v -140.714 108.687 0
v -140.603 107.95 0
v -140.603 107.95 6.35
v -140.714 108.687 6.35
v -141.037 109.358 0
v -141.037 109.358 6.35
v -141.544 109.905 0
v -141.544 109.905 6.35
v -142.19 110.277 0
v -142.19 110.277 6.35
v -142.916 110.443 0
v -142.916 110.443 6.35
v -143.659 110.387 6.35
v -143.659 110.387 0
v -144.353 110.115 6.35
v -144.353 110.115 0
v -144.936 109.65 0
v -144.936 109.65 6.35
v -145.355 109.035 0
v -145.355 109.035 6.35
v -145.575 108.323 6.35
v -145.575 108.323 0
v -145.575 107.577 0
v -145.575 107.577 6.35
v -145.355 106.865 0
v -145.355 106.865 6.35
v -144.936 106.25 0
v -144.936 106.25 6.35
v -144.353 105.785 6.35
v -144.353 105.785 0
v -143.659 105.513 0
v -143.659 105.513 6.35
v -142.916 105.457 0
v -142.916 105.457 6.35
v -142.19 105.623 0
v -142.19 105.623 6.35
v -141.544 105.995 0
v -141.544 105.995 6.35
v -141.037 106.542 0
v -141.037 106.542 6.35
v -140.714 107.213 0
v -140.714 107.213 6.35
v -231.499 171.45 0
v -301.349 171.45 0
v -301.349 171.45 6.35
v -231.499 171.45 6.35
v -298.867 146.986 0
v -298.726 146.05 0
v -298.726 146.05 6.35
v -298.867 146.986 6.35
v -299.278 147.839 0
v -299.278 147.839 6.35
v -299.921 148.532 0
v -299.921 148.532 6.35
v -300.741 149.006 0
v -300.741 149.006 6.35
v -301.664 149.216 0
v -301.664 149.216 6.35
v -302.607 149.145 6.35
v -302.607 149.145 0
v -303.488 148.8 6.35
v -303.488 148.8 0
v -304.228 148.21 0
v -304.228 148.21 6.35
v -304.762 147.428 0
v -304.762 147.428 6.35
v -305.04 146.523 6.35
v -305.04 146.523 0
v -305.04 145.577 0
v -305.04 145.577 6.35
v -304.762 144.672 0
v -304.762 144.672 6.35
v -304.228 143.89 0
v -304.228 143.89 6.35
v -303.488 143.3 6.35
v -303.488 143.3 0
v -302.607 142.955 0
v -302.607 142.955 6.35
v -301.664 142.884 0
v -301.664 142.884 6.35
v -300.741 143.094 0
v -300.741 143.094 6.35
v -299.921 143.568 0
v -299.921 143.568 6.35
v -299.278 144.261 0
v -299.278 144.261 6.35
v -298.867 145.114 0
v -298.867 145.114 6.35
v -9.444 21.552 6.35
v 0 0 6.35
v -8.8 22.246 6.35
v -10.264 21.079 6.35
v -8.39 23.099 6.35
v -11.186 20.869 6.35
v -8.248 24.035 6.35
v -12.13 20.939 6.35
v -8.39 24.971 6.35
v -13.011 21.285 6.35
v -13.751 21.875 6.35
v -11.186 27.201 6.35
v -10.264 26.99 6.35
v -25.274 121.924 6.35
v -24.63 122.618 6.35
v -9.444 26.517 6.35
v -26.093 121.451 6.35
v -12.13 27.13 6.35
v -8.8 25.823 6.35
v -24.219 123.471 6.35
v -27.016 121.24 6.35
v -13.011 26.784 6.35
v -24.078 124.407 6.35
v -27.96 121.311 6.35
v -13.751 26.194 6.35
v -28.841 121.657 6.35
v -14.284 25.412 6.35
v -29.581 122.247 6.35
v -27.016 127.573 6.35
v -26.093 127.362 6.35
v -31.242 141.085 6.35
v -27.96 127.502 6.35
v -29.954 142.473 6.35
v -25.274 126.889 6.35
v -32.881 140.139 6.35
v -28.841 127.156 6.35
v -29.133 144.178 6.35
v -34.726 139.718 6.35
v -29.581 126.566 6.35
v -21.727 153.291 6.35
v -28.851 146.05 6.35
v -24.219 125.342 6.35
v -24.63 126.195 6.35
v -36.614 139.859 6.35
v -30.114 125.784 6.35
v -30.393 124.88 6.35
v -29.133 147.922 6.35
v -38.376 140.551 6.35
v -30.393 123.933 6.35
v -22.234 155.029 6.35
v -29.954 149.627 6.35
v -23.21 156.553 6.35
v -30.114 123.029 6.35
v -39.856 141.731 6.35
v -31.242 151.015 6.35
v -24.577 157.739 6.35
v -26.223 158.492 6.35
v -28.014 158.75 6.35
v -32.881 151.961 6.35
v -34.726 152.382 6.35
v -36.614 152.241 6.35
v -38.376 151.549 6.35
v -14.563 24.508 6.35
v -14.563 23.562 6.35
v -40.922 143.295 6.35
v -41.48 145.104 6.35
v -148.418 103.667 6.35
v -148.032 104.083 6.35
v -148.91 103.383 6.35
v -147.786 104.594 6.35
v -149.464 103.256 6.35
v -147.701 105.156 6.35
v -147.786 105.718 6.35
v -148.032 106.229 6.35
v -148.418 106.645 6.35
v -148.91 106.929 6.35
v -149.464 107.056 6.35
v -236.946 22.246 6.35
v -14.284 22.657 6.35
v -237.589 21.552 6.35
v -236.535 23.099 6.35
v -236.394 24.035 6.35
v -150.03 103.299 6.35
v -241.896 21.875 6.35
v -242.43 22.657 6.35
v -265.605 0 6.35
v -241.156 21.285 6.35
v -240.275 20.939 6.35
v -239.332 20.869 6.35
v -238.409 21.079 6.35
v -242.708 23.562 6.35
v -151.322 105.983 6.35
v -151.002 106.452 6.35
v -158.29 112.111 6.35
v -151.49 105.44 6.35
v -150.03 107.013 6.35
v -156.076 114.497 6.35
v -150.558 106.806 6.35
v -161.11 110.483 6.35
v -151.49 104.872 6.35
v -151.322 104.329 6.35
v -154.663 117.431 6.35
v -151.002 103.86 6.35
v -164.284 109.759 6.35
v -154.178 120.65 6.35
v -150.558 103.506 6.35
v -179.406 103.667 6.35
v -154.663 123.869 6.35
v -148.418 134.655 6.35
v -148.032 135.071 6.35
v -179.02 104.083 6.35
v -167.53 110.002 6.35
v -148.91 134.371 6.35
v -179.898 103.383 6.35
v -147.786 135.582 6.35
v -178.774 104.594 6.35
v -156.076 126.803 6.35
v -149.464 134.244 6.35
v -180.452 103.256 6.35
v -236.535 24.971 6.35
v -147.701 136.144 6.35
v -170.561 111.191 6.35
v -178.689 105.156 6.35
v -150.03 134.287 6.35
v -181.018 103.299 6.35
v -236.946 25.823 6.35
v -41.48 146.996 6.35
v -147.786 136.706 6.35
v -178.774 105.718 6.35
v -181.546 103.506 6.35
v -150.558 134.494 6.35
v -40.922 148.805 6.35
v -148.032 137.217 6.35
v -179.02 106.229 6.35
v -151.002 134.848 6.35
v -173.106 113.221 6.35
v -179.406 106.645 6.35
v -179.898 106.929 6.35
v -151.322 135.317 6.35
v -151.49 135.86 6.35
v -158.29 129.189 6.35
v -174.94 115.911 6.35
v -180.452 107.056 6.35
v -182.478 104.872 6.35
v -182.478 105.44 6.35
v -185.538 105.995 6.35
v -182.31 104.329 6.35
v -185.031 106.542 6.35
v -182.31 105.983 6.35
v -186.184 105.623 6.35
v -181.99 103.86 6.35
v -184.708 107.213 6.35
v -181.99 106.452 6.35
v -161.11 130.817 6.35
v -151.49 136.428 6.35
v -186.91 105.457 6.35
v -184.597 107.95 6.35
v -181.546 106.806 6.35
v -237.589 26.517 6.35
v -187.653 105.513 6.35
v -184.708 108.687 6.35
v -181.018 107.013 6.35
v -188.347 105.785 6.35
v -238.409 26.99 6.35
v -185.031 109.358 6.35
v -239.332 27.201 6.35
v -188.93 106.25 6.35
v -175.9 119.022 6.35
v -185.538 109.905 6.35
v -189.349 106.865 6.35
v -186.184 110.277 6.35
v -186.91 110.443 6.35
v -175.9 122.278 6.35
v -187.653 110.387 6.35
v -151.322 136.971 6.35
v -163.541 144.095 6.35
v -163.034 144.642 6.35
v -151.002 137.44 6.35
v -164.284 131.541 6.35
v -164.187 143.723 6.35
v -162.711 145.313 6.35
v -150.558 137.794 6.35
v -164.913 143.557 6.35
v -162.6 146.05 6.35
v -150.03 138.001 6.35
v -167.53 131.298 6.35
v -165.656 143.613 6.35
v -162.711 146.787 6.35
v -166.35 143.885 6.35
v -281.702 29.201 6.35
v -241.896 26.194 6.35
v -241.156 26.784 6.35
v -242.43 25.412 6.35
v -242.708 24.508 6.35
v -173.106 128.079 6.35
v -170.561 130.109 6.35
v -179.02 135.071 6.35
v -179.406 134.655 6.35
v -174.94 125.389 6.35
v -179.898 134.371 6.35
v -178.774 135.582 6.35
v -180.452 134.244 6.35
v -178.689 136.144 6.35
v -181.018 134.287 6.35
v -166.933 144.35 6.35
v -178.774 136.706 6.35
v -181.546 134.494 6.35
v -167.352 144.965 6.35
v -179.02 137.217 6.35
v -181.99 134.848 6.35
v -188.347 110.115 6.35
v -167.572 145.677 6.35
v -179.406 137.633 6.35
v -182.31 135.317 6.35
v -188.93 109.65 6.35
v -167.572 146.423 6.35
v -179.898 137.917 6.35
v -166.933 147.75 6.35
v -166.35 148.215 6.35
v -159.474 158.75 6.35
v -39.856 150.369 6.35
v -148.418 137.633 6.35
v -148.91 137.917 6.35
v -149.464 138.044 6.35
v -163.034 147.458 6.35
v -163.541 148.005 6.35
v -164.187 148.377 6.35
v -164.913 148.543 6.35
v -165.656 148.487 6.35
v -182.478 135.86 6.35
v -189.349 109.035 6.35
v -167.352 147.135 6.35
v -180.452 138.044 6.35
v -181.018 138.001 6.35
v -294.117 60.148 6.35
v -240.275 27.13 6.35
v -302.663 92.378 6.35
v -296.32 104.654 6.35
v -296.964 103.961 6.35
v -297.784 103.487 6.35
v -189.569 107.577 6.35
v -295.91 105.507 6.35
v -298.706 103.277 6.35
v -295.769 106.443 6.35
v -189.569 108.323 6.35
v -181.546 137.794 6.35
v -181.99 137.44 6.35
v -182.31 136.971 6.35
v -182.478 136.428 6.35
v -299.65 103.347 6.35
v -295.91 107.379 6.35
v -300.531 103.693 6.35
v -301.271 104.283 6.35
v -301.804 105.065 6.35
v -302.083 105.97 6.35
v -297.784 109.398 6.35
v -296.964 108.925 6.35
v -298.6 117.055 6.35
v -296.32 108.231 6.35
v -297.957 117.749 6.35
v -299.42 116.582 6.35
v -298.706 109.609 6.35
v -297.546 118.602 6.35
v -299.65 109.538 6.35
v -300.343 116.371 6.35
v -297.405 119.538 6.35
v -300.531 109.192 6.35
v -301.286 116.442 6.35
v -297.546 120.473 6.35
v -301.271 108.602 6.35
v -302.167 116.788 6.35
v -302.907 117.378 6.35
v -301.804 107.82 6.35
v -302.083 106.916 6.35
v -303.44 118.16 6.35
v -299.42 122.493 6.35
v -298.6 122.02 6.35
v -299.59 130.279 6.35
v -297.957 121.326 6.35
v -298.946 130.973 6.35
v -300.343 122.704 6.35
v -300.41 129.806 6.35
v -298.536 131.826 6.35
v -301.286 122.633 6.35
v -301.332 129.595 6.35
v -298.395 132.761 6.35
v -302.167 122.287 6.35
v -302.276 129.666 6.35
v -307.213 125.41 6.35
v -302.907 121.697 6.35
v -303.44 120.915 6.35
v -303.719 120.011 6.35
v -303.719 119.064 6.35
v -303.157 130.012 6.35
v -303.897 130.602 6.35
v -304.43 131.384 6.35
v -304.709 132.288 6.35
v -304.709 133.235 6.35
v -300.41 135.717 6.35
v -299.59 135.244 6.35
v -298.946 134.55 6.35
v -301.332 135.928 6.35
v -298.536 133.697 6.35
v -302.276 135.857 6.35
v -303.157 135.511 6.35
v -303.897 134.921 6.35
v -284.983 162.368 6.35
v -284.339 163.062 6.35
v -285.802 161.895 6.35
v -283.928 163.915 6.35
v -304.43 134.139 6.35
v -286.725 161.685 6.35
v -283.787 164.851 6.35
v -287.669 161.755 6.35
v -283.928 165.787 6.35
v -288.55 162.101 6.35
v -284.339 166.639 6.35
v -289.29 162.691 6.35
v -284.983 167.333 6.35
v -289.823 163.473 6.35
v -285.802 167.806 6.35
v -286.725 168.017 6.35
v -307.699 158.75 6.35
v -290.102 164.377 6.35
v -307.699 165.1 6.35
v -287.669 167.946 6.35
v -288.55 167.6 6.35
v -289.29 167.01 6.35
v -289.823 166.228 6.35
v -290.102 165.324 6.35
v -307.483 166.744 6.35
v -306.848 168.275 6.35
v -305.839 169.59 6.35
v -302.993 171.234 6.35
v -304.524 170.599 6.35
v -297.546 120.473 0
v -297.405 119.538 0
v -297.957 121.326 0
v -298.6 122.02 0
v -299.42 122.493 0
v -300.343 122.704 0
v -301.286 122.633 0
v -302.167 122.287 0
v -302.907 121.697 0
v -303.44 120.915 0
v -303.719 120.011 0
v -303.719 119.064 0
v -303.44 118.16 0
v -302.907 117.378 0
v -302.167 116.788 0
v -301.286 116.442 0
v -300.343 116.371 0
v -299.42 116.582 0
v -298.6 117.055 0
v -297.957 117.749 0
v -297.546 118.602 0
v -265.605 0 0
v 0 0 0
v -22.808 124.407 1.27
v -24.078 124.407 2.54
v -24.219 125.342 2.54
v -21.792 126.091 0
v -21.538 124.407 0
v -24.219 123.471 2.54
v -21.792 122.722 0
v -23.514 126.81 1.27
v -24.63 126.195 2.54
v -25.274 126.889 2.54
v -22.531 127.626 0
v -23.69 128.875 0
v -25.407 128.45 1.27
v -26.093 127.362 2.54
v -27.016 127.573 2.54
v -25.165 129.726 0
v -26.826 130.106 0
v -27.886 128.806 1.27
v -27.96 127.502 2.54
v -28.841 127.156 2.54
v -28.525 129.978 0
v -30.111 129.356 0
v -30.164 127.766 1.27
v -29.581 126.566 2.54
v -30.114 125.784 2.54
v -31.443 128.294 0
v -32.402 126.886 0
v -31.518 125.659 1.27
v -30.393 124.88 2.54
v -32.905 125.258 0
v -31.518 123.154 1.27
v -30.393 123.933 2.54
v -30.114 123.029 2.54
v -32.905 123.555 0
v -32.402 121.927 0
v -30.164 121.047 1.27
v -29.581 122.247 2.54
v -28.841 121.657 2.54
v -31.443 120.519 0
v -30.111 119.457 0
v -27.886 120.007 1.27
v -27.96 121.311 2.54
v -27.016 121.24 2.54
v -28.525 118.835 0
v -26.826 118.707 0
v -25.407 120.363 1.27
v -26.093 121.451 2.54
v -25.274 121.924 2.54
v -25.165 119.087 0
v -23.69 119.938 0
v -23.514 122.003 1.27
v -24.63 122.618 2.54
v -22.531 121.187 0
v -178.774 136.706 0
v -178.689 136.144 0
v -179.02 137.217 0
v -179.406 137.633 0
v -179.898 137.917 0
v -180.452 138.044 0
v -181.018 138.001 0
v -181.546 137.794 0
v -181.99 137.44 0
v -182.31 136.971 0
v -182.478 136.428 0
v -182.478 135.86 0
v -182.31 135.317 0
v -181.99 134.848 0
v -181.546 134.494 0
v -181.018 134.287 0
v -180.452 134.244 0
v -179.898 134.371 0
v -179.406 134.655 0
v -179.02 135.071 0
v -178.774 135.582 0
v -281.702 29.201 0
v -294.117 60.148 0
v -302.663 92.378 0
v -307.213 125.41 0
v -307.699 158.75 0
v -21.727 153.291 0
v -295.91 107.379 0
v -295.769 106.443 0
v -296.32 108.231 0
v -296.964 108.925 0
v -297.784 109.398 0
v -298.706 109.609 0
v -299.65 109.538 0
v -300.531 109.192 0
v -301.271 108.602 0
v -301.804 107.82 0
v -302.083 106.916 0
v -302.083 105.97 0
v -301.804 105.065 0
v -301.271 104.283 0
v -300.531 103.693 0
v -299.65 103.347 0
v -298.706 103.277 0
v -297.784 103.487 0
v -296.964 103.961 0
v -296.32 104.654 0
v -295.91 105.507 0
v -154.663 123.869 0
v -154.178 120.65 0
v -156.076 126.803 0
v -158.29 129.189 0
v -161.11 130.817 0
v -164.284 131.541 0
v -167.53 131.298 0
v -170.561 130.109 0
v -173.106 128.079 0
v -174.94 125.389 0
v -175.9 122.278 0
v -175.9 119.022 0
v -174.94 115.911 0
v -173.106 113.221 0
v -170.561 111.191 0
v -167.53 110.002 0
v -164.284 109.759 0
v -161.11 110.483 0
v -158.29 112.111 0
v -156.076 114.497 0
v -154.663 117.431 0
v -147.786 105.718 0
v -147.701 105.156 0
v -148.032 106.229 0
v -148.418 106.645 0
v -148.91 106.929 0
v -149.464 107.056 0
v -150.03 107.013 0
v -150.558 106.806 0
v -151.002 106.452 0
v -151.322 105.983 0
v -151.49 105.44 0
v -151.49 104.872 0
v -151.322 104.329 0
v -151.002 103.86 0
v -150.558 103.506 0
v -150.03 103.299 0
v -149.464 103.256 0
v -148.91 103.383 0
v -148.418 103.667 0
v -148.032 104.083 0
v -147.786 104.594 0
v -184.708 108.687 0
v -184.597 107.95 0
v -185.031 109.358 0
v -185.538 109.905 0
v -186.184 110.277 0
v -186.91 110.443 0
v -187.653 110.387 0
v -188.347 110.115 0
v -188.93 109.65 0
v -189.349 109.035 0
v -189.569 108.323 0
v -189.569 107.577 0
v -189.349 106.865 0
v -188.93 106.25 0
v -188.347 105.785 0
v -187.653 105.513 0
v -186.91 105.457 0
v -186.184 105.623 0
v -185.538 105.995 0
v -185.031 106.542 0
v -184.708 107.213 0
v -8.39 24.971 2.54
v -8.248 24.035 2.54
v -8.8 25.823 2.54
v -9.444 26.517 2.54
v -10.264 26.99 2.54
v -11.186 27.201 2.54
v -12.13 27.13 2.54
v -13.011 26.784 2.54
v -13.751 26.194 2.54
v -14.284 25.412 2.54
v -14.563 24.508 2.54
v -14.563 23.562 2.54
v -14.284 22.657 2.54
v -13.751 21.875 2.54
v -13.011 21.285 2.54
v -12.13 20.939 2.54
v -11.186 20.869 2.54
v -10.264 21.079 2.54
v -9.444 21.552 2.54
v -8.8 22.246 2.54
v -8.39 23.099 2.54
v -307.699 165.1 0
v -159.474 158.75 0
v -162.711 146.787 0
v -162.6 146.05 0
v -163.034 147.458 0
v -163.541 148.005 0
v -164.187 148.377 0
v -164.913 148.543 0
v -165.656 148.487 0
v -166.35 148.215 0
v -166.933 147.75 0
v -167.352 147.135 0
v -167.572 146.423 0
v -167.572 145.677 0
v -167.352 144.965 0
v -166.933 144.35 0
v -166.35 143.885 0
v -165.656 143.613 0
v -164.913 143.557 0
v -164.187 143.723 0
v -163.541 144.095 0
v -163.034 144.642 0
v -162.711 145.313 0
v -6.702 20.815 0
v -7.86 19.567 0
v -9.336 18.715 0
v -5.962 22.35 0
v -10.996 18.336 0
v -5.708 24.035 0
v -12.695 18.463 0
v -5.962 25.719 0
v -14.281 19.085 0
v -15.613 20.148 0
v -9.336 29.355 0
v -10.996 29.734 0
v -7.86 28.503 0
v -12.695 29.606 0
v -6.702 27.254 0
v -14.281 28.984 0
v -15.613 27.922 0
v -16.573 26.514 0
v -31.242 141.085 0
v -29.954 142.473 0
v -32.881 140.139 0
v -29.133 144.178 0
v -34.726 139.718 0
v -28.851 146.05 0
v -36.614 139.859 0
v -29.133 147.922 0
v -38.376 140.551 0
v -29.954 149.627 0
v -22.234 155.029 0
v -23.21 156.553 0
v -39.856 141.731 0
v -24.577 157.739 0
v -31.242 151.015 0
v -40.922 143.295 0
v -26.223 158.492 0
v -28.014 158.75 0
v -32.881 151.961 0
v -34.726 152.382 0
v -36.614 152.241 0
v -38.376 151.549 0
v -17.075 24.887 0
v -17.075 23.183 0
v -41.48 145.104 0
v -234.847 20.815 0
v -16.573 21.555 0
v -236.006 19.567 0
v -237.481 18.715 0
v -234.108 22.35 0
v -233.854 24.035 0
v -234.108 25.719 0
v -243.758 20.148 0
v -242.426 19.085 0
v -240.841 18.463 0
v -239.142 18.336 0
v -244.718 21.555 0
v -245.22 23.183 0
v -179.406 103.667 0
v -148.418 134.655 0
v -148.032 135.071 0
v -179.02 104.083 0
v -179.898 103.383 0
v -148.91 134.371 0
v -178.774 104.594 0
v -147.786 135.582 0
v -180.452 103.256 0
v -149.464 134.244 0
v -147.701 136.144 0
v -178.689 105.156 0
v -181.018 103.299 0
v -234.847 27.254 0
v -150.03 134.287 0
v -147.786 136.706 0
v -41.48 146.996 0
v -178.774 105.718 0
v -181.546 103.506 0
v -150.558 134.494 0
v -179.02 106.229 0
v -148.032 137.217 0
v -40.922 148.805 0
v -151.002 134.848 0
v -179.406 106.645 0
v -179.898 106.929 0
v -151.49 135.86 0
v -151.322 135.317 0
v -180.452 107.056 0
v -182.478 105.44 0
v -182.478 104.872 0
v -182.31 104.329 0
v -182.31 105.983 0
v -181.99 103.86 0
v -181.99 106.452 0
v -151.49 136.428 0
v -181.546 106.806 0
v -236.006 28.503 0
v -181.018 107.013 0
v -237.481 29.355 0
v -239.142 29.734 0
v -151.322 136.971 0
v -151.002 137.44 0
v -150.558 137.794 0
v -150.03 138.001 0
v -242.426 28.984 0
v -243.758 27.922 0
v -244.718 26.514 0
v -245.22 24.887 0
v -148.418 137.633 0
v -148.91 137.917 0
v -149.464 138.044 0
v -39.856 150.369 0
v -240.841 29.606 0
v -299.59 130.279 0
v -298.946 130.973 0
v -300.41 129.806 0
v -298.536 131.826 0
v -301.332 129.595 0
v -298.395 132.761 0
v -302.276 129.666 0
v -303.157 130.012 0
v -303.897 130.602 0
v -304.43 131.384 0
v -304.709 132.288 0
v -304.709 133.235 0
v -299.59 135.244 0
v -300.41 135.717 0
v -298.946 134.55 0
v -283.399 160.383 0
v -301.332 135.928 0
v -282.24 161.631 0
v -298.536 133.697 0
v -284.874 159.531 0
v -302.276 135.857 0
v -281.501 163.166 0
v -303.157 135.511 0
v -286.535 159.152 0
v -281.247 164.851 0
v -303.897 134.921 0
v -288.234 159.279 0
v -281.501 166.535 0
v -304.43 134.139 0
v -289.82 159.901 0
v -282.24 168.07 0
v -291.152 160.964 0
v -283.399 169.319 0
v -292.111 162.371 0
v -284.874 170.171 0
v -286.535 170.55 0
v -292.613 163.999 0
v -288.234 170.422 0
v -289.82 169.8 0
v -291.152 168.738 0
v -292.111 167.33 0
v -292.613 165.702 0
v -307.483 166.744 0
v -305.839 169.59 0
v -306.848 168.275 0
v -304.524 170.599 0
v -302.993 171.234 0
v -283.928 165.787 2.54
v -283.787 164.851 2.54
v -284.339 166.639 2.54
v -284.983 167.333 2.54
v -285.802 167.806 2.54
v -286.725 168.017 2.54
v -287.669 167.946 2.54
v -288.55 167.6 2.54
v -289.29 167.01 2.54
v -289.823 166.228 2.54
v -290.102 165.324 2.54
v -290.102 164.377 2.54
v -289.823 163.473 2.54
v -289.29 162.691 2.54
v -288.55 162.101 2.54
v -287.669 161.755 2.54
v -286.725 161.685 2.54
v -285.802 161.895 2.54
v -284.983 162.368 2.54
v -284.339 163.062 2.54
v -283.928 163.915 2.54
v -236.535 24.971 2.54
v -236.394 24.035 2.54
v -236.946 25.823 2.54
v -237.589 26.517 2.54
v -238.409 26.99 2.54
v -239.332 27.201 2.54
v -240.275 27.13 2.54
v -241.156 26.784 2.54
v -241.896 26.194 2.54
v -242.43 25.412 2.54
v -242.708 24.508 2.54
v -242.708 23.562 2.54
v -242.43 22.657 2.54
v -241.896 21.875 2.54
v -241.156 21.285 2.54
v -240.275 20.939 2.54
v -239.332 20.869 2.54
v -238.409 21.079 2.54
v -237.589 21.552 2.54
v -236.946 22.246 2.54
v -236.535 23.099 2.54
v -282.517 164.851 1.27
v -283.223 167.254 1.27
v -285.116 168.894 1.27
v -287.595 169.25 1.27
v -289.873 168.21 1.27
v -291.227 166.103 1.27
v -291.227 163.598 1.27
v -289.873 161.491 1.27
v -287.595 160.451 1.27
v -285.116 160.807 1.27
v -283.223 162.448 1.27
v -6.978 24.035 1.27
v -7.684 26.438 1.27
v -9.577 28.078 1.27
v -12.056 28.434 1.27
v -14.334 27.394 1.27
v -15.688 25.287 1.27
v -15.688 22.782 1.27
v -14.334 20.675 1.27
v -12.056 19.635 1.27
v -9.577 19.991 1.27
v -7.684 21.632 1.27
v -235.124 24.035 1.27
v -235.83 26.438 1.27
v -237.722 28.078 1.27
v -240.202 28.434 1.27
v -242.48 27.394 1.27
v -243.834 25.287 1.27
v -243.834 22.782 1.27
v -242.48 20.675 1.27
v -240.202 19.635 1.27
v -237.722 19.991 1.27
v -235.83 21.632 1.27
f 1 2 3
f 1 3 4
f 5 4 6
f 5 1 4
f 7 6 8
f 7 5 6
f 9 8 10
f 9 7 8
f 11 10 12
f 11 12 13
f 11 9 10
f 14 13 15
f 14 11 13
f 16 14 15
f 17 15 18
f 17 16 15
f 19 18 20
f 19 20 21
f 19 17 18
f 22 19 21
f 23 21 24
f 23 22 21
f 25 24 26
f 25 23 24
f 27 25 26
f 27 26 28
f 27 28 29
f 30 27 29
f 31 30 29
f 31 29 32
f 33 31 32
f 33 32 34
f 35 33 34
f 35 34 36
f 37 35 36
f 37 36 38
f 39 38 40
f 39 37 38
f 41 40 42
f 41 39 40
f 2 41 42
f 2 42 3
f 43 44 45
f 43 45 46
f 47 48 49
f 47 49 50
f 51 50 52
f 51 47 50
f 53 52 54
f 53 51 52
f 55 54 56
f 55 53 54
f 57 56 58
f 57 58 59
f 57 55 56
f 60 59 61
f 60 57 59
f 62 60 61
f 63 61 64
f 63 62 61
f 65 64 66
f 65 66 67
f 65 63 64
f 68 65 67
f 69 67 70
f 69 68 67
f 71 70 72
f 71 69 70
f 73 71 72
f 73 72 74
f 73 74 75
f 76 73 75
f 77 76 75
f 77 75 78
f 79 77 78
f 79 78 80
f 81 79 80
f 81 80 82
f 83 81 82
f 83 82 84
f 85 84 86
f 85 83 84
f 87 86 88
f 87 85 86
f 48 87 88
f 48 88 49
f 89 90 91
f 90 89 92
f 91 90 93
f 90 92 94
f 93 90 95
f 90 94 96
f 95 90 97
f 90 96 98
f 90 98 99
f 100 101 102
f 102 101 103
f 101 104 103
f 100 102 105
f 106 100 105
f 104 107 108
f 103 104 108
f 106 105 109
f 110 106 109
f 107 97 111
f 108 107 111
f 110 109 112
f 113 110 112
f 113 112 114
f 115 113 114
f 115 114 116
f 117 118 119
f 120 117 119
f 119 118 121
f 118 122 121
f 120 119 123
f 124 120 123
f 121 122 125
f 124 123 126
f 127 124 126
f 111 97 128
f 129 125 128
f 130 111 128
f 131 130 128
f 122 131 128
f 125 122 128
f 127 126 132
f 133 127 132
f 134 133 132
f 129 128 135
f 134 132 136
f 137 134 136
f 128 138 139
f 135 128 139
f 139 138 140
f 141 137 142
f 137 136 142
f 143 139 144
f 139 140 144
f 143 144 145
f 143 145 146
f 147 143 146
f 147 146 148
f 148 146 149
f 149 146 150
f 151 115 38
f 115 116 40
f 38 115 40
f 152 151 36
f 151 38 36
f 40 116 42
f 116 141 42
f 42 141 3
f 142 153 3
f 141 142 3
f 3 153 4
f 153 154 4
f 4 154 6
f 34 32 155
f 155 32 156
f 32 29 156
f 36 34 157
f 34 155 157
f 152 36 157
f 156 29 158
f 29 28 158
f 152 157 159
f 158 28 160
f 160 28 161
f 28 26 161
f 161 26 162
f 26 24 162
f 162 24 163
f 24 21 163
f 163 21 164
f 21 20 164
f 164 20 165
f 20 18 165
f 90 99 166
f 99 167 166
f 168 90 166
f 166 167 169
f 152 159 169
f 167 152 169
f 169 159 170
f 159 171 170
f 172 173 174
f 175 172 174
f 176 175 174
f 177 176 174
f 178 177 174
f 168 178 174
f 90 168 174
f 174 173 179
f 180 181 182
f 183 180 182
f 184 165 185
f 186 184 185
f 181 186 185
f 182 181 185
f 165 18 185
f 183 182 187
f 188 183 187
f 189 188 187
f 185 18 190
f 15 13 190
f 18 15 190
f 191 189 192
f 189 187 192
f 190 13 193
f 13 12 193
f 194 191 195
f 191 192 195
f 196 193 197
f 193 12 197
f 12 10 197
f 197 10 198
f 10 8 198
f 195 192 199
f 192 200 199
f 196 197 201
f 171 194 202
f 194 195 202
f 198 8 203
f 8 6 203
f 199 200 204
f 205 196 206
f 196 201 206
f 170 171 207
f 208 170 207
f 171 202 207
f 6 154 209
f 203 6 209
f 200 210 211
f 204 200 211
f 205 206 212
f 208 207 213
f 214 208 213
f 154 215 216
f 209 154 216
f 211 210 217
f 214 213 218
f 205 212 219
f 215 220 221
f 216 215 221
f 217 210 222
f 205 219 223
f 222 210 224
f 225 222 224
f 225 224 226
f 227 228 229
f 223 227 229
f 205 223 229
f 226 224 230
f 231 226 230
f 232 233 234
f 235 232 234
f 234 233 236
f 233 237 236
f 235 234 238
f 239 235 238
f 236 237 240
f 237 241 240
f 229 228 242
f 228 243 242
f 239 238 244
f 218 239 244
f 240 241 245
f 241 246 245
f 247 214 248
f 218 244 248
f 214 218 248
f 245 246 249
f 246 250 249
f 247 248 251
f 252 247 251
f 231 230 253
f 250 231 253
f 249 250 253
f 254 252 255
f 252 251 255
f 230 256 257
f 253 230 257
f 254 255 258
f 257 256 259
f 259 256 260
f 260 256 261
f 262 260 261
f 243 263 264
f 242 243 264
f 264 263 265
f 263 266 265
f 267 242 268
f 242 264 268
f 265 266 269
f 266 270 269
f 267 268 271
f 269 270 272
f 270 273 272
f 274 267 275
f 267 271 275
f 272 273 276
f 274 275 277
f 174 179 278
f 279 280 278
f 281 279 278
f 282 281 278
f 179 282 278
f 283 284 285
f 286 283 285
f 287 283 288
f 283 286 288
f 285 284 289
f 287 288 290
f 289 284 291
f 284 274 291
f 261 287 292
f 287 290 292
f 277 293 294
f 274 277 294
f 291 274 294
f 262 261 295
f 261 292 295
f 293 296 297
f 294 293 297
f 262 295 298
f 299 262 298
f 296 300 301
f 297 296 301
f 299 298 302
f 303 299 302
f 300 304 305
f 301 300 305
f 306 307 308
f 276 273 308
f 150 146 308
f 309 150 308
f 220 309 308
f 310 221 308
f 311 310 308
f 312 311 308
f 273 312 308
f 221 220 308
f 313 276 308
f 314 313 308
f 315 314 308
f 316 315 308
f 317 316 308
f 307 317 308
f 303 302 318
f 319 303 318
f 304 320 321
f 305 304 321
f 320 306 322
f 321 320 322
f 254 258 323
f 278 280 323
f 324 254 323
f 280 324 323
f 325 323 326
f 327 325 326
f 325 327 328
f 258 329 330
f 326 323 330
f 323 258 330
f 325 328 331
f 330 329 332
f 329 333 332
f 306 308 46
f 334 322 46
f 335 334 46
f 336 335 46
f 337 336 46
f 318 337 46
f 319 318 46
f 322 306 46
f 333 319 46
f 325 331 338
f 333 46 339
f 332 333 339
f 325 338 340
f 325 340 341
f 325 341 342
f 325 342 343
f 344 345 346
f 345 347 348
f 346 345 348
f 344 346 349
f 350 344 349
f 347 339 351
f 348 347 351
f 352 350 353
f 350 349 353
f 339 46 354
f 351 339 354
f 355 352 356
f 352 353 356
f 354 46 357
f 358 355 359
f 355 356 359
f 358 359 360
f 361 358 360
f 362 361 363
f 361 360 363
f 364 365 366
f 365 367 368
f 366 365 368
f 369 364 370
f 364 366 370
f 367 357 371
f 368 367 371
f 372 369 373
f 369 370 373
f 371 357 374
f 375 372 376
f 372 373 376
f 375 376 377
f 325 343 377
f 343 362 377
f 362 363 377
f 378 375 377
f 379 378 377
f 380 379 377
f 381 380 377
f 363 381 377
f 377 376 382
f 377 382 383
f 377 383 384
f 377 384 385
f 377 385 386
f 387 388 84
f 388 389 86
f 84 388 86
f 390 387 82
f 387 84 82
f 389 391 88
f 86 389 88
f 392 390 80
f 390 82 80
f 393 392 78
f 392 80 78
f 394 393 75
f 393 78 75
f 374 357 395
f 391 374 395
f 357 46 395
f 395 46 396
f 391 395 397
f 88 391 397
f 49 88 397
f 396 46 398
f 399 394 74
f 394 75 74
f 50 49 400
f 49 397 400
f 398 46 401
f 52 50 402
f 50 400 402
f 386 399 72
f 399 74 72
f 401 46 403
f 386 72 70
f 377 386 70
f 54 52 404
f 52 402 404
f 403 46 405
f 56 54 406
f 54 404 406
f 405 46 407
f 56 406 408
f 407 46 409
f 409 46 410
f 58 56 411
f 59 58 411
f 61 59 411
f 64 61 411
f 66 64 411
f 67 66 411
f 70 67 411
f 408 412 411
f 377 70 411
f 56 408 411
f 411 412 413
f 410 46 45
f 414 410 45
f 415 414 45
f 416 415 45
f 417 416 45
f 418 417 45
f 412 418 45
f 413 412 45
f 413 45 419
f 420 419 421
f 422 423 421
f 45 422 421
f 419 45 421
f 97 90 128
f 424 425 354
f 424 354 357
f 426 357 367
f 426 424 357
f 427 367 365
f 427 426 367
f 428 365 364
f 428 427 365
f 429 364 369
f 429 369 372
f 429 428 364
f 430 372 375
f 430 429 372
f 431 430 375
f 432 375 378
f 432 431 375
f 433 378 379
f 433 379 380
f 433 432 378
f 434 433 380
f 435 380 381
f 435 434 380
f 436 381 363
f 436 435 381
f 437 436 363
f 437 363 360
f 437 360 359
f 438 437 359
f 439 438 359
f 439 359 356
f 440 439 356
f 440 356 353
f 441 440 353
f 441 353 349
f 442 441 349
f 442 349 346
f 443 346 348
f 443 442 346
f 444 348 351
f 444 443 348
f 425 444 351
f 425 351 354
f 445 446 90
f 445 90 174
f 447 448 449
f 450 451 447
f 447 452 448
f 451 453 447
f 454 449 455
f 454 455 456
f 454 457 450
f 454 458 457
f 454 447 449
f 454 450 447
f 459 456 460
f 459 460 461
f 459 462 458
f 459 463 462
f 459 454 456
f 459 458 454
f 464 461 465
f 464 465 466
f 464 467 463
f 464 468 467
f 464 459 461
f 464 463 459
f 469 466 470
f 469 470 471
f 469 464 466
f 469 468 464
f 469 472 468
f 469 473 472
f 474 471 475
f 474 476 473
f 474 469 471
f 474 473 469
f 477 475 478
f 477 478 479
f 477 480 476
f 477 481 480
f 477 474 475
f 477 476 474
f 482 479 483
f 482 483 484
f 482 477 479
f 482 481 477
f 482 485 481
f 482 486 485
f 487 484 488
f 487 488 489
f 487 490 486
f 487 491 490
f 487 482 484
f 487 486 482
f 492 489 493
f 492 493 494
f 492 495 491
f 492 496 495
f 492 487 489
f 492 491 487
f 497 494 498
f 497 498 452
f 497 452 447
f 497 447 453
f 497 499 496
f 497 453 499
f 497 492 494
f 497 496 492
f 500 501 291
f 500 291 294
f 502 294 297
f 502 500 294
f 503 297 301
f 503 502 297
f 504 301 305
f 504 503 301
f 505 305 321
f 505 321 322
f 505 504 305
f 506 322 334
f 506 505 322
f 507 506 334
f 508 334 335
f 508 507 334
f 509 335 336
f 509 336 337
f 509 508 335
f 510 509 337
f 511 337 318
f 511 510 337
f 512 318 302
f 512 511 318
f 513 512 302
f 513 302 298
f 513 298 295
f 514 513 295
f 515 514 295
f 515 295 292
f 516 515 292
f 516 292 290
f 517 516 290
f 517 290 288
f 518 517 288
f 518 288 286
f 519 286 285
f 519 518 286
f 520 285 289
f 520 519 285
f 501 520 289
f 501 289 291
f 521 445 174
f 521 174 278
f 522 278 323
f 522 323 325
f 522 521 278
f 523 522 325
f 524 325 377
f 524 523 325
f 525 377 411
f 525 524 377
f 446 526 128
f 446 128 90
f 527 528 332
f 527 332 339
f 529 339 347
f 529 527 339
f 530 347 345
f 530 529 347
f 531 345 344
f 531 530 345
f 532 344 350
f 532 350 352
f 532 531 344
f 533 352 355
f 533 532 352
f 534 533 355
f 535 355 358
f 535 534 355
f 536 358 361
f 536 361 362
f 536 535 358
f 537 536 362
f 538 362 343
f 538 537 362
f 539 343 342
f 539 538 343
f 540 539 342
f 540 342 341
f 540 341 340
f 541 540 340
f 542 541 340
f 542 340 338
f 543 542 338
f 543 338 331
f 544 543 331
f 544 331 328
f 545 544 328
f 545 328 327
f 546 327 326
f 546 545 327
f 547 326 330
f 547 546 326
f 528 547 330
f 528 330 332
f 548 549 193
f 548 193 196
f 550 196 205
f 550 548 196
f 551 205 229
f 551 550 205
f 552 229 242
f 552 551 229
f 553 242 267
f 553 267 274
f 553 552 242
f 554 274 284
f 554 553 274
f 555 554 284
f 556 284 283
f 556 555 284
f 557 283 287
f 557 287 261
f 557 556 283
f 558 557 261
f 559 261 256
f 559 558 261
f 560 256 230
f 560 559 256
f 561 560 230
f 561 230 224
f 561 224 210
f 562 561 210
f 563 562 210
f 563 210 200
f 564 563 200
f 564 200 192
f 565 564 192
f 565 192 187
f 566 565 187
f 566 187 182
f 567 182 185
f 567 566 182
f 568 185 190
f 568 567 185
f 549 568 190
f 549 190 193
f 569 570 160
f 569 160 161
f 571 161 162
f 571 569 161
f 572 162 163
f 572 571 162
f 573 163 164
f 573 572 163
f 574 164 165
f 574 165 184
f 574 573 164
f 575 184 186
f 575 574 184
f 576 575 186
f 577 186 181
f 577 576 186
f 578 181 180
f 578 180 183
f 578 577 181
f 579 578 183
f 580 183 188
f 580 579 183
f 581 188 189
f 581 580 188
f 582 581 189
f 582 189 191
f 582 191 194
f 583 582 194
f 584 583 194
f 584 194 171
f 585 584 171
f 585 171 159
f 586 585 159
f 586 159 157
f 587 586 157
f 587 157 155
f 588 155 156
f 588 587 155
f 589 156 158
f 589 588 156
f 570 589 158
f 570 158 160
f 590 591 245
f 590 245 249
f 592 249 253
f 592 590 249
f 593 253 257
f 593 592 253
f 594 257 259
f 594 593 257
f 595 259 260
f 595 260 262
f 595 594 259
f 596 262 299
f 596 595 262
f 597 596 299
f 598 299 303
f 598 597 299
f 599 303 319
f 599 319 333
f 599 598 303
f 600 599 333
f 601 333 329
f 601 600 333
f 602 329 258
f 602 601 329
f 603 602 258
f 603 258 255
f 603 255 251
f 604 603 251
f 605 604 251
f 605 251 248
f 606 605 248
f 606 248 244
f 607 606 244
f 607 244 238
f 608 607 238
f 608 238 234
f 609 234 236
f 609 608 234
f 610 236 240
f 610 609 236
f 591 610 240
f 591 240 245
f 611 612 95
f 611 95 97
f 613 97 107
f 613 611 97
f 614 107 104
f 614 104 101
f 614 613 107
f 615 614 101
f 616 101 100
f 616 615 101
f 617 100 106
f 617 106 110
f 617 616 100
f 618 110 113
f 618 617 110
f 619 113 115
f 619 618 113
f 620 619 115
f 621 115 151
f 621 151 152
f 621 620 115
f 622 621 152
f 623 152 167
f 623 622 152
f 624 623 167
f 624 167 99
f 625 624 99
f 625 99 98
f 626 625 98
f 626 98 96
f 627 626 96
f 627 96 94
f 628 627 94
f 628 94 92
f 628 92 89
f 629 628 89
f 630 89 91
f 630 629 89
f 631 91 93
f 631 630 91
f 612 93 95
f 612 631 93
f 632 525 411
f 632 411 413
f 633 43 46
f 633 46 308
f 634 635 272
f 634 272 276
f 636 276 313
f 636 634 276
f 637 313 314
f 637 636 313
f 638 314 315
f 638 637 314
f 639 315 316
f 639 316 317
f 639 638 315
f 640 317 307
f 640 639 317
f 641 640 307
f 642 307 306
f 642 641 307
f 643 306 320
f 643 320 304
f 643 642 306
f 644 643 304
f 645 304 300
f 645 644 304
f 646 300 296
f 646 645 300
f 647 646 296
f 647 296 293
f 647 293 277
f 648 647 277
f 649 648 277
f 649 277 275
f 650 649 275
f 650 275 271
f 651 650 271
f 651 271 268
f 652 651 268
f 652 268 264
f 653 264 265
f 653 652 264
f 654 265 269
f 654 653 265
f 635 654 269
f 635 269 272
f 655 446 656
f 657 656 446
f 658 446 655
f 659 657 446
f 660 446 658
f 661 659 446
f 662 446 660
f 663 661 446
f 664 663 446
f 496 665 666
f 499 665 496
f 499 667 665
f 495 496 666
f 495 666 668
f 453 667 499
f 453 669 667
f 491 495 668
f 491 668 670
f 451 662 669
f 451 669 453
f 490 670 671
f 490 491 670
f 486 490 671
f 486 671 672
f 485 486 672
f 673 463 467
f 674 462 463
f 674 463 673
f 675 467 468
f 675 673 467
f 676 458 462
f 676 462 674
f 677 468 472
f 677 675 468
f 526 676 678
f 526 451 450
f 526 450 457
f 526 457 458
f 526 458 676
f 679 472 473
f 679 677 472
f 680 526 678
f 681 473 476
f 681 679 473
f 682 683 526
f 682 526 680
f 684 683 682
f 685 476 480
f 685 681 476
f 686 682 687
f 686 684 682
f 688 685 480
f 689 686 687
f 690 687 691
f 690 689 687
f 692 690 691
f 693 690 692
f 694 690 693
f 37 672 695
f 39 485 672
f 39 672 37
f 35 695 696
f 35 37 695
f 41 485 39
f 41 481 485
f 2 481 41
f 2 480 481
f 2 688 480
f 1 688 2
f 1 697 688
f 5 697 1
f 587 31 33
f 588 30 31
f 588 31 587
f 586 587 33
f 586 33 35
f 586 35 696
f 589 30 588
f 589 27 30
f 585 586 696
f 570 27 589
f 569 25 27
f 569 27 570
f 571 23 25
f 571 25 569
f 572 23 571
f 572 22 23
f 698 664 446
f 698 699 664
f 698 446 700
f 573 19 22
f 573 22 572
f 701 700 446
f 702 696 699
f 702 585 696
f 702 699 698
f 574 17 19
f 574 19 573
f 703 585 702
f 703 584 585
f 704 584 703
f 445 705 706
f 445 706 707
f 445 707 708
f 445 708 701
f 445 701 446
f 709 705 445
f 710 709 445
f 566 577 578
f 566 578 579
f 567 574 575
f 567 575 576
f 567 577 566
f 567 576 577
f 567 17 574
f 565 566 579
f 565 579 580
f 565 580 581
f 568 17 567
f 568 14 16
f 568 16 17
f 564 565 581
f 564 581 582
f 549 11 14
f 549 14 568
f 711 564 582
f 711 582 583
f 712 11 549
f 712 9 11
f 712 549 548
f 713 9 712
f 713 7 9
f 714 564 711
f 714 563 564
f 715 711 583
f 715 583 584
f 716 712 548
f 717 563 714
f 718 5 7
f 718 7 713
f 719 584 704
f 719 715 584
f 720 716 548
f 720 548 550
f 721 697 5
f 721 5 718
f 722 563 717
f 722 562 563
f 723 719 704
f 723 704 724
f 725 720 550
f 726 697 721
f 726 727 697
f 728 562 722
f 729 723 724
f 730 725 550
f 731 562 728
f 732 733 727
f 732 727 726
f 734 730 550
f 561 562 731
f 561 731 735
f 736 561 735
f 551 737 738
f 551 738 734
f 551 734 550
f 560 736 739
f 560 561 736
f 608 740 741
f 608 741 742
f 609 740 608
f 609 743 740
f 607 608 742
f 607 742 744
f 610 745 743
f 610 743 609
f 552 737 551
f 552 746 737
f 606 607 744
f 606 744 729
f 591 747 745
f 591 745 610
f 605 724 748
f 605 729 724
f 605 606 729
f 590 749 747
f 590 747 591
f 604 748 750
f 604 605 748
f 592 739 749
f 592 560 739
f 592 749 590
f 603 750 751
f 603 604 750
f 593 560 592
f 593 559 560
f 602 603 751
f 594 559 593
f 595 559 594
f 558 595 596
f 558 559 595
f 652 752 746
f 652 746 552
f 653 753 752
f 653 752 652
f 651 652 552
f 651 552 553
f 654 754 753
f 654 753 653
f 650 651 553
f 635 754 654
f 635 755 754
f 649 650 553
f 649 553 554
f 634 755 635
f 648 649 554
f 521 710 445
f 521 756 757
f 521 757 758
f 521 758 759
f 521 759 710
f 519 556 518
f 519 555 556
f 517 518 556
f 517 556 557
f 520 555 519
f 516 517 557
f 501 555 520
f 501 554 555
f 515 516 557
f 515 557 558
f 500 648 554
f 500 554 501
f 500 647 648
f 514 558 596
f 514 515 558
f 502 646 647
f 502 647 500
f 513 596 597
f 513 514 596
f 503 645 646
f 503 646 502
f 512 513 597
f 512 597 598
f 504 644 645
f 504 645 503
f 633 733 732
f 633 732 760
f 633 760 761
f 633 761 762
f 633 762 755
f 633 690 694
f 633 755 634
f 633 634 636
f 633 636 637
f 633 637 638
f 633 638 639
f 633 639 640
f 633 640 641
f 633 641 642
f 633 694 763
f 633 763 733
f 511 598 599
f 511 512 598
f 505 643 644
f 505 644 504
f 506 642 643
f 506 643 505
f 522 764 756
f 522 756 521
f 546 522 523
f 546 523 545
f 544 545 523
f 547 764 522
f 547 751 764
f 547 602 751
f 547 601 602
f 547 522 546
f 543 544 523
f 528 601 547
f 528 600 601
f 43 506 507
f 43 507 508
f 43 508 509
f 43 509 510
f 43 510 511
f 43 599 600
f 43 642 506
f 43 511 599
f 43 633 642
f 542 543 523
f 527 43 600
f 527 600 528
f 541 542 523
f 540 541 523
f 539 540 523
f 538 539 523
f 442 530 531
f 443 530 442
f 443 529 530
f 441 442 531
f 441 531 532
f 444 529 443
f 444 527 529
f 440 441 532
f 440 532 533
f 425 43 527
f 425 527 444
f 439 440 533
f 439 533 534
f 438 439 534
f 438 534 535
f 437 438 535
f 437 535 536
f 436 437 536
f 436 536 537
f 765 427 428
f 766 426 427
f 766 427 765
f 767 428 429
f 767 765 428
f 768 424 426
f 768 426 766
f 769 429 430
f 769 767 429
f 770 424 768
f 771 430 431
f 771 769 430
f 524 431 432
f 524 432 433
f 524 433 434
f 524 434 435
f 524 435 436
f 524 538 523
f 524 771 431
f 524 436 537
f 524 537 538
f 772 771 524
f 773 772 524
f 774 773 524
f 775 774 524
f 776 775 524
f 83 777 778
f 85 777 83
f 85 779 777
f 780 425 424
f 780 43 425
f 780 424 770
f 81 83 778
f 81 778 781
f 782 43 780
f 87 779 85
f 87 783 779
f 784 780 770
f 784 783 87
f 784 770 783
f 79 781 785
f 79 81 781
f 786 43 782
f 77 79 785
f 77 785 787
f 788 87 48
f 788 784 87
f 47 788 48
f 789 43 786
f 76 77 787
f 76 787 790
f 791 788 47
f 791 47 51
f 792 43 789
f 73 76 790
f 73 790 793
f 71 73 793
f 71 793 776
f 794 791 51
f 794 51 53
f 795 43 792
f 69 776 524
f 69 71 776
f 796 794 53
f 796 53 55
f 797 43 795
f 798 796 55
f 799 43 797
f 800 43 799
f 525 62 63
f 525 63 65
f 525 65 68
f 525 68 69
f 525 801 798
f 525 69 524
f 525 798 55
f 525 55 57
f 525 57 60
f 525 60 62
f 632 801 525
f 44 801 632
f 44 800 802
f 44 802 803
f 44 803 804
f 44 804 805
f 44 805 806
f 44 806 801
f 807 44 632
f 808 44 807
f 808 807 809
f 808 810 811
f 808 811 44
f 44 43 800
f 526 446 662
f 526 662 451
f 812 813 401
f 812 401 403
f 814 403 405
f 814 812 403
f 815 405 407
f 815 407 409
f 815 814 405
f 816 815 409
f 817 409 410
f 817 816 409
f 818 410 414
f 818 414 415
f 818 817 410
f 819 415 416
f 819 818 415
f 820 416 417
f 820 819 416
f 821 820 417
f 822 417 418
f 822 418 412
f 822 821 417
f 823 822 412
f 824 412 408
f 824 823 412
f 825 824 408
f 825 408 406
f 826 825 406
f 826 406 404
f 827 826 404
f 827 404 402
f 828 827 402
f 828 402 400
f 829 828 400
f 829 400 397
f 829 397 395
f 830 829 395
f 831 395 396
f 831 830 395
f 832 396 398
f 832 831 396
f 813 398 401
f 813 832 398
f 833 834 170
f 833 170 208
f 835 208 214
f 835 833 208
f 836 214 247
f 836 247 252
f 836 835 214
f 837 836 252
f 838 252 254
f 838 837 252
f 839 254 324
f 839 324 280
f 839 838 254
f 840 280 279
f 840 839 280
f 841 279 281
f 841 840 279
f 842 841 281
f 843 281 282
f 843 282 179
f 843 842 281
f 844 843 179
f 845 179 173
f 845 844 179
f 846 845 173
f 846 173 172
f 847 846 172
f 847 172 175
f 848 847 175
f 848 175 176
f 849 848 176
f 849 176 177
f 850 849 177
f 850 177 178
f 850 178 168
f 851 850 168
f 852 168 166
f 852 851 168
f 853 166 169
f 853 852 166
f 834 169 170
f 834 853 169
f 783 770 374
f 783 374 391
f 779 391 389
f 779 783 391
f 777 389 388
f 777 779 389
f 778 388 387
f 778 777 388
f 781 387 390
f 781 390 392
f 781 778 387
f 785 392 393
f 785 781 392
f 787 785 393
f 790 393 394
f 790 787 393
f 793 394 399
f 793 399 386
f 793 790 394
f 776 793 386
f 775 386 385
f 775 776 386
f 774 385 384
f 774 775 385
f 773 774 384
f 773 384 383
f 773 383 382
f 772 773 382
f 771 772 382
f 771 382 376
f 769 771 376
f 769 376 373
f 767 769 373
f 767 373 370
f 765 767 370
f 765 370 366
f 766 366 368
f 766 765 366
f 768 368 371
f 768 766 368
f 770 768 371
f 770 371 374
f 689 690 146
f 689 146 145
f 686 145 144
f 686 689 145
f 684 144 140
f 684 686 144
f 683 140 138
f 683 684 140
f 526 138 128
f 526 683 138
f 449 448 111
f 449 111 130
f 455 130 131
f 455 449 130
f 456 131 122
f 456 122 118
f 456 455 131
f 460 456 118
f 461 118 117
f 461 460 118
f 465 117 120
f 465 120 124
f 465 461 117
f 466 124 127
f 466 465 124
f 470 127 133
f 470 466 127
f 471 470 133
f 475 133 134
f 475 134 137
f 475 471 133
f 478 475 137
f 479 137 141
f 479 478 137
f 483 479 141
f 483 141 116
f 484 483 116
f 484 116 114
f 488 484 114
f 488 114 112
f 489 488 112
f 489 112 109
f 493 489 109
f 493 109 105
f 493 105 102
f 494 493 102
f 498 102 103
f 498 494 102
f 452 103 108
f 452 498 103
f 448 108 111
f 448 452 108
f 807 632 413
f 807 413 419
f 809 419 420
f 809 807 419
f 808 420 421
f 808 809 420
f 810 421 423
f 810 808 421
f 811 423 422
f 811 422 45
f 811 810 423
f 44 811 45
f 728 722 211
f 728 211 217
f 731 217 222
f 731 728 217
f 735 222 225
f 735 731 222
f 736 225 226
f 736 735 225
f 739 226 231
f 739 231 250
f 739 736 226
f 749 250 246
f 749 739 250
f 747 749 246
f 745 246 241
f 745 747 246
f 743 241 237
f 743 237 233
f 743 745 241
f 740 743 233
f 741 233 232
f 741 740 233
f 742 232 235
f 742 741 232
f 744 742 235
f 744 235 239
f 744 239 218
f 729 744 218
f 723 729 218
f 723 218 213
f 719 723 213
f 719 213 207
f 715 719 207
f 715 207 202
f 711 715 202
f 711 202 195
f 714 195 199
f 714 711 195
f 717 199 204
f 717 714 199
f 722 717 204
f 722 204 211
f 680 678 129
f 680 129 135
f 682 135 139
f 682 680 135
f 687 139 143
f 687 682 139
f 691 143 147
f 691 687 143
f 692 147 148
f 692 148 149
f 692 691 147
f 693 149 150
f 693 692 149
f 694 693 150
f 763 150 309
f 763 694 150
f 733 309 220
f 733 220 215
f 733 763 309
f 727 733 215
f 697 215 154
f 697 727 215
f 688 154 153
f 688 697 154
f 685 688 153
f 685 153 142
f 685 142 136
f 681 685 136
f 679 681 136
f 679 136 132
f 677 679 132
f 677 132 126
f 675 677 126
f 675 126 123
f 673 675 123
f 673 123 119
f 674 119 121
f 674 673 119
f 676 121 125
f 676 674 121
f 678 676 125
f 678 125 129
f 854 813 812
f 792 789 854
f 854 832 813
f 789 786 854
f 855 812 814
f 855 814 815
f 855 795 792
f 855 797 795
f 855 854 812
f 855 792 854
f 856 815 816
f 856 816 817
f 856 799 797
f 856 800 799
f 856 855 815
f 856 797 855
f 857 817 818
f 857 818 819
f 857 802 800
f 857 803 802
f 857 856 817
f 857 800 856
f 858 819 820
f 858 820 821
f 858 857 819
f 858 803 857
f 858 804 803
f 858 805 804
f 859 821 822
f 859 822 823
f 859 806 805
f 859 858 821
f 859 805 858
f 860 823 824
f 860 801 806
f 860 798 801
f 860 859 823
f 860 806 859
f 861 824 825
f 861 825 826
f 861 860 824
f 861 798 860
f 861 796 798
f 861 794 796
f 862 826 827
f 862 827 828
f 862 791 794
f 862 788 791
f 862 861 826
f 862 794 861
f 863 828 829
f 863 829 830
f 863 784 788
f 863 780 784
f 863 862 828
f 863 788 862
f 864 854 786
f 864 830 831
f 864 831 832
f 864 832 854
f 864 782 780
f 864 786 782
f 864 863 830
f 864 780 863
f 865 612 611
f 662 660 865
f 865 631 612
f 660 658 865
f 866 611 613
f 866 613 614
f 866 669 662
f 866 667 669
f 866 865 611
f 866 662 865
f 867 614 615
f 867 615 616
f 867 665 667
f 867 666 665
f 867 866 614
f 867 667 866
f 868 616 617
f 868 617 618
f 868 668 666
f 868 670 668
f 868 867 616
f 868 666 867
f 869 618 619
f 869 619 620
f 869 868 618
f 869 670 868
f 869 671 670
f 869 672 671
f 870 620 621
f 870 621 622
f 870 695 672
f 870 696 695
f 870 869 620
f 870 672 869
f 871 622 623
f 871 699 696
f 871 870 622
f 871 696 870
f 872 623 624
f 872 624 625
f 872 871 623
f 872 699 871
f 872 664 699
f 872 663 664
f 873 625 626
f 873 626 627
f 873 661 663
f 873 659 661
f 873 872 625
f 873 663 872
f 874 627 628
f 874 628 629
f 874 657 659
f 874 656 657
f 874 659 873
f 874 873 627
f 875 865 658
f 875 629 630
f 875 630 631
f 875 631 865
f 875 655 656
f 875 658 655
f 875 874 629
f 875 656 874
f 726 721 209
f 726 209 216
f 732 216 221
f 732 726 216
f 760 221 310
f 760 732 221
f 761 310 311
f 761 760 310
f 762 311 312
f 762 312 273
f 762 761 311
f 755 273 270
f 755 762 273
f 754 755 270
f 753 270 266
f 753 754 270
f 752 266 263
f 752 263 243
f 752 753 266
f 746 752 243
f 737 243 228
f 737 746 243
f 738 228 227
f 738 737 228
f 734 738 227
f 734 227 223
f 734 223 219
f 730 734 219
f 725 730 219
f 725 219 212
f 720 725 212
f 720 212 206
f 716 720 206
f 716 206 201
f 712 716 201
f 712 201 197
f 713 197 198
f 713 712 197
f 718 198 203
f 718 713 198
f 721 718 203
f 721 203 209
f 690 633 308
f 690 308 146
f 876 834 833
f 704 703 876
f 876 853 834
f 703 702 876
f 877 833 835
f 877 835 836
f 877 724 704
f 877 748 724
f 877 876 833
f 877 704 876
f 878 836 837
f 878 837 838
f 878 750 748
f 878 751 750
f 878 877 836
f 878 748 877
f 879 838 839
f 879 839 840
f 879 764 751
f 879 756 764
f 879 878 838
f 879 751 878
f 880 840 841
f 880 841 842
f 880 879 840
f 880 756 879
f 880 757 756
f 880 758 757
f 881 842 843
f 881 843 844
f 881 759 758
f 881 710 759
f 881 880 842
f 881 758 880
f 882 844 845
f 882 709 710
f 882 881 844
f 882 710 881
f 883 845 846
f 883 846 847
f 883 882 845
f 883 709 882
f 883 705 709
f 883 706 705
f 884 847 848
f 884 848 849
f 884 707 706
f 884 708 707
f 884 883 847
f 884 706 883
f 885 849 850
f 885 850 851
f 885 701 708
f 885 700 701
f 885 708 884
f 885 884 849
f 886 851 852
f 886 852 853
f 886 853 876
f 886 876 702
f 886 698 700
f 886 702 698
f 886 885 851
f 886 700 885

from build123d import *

# Parameters (mm, degrees)
SKETCH18_R          = 1.905
SKETCH18_R_2        = 3.175
SKETCH18_R_3        = 6.35
SKETCH18_R_4        = 2.5
SKETCH18_R_5        = 10.922
BOSS_EXTRUDE4_DEPTH = 6.35
CHAMFER1_SIZE       = 2.54


with BuildPart() as part:
    # Sketch18 → Boss-Extrude4 (new body)
    with BuildSketch(Plane.XY):
        with BuildLine():
            Line((0, 0), (-265.604745697, 0))
            ThreePointArc((-265.604745697, 0), (-298.882523776, 76.131915965), (-307.699061234, 158.75))
            Line((-307.699061234, 158.75), (-307.699061234, 165.1))
            ThreePointArc((-307.699061234, 165.1), (-305.839189294, 169.590128061), (-301.349061234, 171.45))
            Line((-301.349061234, 171.45), (-231.499061234, 171.45))
            Line((-231.499061234, 171.45), (-159.473782125, 158.75))
            Line((-159.473782125, 158.75), (-28.014368889, 158.75))
            ThreePointArc((-28.014368889, 158.75), (-23.851207857, 157.194850386), (-21.727208485, 153.291130779))
            Line((-21.727208485, 153.291130779), (0, 0))
        make_face()
        with Locations((-180.594, 136.144)):
            Circle(SKETCH18_R, mode=Mode.SUBTRACT)
        with Locations((-11.423473622, 24.034728138)):
            Circle(SKETCH18_R_2, mode=Mode.SUBTRACT)
        with Locations((-27.253356194, 124.406511892)):
            Circle(SKETCH18_R_2, mode=Mode.SUBTRACT)
        with Locations((-35.200938766, 146.05)):
            Circle(SKETCH18_R_3, mode=Mode.SUBTRACT)
        with Locations((-301.900938766, 146.05)):
            Circle(SKETCH18_R_2, mode=Mode.SUBTRACT)
        with Locations((-301.569673588, 132.761391752)):
            Circle(SKETCH18_R_2, mode=Mode.SUBTRACT)
        with Locations((-300.579872803, 119.537524267)):
            Circle(SKETCH18_R_2, mode=Mode.SUBTRACT)
        with Locations((-298.943543444, 106.442822899)):
            Circle(SKETCH18_R_2, mode=Mode.SUBTRACT)
        with Locations((-239.568937637, 24.034728138)):
            Circle(SKETCH18_R_2, mode=Mode.SUBTRACT)
        with Locations((-286.962142025, 164.850708953)):
            Circle(SKETCH18_R_2, mode=Mode.SUBTRACT)
        with Locations((-187.097045256, 107.95)):
            Circle(SKETCH18_R_4, mode=Mode.SUBTRACT)
        with Locations((-180.594, 105.156)):
            Circle(SKETCH18_R, mode=Mode.SUBTRACT)
        with Locations((-165.1, 120.65)):
            Circle(SKETCH18_R_5, mode=Mode.SUBTRACT)
        with Locations((-165.1, 146.05)):
            Circle(SKETCH18_R_4, mode=Mode.SUBTRACT)
        with Locations((-149.606, 105.156)):
            Circle(SKETCH18_R, mode=Mode.SUBTRACT)
        with Locations((-149.606, 136.144)):
            Circle(SKETCH18_R, mode=Mode.SUBTRACT)
        with Locations((-143.102954744, 107.95)):
            Circle(SKETCH18_R_4, mode=Mode.SUBTRACT)
    extrude(amount=BOSS_EXTRUDE4_DEPTH)

    # Chamfer1
    chamfer1_edges = [part.edges().sort_by_distance(p)[0] for p in [
        (-14.598473622, 24.034728138, 0),
        (-30.428356194, 124.406511892, 0),
        (-242.743937637, 24.034728138, 0),
        (-290.137142025, 164.850708953, 0),
    ]]
    chamfer(chamfer1_edges, length=CHAMFER1_SIZE)


solid = part.part
